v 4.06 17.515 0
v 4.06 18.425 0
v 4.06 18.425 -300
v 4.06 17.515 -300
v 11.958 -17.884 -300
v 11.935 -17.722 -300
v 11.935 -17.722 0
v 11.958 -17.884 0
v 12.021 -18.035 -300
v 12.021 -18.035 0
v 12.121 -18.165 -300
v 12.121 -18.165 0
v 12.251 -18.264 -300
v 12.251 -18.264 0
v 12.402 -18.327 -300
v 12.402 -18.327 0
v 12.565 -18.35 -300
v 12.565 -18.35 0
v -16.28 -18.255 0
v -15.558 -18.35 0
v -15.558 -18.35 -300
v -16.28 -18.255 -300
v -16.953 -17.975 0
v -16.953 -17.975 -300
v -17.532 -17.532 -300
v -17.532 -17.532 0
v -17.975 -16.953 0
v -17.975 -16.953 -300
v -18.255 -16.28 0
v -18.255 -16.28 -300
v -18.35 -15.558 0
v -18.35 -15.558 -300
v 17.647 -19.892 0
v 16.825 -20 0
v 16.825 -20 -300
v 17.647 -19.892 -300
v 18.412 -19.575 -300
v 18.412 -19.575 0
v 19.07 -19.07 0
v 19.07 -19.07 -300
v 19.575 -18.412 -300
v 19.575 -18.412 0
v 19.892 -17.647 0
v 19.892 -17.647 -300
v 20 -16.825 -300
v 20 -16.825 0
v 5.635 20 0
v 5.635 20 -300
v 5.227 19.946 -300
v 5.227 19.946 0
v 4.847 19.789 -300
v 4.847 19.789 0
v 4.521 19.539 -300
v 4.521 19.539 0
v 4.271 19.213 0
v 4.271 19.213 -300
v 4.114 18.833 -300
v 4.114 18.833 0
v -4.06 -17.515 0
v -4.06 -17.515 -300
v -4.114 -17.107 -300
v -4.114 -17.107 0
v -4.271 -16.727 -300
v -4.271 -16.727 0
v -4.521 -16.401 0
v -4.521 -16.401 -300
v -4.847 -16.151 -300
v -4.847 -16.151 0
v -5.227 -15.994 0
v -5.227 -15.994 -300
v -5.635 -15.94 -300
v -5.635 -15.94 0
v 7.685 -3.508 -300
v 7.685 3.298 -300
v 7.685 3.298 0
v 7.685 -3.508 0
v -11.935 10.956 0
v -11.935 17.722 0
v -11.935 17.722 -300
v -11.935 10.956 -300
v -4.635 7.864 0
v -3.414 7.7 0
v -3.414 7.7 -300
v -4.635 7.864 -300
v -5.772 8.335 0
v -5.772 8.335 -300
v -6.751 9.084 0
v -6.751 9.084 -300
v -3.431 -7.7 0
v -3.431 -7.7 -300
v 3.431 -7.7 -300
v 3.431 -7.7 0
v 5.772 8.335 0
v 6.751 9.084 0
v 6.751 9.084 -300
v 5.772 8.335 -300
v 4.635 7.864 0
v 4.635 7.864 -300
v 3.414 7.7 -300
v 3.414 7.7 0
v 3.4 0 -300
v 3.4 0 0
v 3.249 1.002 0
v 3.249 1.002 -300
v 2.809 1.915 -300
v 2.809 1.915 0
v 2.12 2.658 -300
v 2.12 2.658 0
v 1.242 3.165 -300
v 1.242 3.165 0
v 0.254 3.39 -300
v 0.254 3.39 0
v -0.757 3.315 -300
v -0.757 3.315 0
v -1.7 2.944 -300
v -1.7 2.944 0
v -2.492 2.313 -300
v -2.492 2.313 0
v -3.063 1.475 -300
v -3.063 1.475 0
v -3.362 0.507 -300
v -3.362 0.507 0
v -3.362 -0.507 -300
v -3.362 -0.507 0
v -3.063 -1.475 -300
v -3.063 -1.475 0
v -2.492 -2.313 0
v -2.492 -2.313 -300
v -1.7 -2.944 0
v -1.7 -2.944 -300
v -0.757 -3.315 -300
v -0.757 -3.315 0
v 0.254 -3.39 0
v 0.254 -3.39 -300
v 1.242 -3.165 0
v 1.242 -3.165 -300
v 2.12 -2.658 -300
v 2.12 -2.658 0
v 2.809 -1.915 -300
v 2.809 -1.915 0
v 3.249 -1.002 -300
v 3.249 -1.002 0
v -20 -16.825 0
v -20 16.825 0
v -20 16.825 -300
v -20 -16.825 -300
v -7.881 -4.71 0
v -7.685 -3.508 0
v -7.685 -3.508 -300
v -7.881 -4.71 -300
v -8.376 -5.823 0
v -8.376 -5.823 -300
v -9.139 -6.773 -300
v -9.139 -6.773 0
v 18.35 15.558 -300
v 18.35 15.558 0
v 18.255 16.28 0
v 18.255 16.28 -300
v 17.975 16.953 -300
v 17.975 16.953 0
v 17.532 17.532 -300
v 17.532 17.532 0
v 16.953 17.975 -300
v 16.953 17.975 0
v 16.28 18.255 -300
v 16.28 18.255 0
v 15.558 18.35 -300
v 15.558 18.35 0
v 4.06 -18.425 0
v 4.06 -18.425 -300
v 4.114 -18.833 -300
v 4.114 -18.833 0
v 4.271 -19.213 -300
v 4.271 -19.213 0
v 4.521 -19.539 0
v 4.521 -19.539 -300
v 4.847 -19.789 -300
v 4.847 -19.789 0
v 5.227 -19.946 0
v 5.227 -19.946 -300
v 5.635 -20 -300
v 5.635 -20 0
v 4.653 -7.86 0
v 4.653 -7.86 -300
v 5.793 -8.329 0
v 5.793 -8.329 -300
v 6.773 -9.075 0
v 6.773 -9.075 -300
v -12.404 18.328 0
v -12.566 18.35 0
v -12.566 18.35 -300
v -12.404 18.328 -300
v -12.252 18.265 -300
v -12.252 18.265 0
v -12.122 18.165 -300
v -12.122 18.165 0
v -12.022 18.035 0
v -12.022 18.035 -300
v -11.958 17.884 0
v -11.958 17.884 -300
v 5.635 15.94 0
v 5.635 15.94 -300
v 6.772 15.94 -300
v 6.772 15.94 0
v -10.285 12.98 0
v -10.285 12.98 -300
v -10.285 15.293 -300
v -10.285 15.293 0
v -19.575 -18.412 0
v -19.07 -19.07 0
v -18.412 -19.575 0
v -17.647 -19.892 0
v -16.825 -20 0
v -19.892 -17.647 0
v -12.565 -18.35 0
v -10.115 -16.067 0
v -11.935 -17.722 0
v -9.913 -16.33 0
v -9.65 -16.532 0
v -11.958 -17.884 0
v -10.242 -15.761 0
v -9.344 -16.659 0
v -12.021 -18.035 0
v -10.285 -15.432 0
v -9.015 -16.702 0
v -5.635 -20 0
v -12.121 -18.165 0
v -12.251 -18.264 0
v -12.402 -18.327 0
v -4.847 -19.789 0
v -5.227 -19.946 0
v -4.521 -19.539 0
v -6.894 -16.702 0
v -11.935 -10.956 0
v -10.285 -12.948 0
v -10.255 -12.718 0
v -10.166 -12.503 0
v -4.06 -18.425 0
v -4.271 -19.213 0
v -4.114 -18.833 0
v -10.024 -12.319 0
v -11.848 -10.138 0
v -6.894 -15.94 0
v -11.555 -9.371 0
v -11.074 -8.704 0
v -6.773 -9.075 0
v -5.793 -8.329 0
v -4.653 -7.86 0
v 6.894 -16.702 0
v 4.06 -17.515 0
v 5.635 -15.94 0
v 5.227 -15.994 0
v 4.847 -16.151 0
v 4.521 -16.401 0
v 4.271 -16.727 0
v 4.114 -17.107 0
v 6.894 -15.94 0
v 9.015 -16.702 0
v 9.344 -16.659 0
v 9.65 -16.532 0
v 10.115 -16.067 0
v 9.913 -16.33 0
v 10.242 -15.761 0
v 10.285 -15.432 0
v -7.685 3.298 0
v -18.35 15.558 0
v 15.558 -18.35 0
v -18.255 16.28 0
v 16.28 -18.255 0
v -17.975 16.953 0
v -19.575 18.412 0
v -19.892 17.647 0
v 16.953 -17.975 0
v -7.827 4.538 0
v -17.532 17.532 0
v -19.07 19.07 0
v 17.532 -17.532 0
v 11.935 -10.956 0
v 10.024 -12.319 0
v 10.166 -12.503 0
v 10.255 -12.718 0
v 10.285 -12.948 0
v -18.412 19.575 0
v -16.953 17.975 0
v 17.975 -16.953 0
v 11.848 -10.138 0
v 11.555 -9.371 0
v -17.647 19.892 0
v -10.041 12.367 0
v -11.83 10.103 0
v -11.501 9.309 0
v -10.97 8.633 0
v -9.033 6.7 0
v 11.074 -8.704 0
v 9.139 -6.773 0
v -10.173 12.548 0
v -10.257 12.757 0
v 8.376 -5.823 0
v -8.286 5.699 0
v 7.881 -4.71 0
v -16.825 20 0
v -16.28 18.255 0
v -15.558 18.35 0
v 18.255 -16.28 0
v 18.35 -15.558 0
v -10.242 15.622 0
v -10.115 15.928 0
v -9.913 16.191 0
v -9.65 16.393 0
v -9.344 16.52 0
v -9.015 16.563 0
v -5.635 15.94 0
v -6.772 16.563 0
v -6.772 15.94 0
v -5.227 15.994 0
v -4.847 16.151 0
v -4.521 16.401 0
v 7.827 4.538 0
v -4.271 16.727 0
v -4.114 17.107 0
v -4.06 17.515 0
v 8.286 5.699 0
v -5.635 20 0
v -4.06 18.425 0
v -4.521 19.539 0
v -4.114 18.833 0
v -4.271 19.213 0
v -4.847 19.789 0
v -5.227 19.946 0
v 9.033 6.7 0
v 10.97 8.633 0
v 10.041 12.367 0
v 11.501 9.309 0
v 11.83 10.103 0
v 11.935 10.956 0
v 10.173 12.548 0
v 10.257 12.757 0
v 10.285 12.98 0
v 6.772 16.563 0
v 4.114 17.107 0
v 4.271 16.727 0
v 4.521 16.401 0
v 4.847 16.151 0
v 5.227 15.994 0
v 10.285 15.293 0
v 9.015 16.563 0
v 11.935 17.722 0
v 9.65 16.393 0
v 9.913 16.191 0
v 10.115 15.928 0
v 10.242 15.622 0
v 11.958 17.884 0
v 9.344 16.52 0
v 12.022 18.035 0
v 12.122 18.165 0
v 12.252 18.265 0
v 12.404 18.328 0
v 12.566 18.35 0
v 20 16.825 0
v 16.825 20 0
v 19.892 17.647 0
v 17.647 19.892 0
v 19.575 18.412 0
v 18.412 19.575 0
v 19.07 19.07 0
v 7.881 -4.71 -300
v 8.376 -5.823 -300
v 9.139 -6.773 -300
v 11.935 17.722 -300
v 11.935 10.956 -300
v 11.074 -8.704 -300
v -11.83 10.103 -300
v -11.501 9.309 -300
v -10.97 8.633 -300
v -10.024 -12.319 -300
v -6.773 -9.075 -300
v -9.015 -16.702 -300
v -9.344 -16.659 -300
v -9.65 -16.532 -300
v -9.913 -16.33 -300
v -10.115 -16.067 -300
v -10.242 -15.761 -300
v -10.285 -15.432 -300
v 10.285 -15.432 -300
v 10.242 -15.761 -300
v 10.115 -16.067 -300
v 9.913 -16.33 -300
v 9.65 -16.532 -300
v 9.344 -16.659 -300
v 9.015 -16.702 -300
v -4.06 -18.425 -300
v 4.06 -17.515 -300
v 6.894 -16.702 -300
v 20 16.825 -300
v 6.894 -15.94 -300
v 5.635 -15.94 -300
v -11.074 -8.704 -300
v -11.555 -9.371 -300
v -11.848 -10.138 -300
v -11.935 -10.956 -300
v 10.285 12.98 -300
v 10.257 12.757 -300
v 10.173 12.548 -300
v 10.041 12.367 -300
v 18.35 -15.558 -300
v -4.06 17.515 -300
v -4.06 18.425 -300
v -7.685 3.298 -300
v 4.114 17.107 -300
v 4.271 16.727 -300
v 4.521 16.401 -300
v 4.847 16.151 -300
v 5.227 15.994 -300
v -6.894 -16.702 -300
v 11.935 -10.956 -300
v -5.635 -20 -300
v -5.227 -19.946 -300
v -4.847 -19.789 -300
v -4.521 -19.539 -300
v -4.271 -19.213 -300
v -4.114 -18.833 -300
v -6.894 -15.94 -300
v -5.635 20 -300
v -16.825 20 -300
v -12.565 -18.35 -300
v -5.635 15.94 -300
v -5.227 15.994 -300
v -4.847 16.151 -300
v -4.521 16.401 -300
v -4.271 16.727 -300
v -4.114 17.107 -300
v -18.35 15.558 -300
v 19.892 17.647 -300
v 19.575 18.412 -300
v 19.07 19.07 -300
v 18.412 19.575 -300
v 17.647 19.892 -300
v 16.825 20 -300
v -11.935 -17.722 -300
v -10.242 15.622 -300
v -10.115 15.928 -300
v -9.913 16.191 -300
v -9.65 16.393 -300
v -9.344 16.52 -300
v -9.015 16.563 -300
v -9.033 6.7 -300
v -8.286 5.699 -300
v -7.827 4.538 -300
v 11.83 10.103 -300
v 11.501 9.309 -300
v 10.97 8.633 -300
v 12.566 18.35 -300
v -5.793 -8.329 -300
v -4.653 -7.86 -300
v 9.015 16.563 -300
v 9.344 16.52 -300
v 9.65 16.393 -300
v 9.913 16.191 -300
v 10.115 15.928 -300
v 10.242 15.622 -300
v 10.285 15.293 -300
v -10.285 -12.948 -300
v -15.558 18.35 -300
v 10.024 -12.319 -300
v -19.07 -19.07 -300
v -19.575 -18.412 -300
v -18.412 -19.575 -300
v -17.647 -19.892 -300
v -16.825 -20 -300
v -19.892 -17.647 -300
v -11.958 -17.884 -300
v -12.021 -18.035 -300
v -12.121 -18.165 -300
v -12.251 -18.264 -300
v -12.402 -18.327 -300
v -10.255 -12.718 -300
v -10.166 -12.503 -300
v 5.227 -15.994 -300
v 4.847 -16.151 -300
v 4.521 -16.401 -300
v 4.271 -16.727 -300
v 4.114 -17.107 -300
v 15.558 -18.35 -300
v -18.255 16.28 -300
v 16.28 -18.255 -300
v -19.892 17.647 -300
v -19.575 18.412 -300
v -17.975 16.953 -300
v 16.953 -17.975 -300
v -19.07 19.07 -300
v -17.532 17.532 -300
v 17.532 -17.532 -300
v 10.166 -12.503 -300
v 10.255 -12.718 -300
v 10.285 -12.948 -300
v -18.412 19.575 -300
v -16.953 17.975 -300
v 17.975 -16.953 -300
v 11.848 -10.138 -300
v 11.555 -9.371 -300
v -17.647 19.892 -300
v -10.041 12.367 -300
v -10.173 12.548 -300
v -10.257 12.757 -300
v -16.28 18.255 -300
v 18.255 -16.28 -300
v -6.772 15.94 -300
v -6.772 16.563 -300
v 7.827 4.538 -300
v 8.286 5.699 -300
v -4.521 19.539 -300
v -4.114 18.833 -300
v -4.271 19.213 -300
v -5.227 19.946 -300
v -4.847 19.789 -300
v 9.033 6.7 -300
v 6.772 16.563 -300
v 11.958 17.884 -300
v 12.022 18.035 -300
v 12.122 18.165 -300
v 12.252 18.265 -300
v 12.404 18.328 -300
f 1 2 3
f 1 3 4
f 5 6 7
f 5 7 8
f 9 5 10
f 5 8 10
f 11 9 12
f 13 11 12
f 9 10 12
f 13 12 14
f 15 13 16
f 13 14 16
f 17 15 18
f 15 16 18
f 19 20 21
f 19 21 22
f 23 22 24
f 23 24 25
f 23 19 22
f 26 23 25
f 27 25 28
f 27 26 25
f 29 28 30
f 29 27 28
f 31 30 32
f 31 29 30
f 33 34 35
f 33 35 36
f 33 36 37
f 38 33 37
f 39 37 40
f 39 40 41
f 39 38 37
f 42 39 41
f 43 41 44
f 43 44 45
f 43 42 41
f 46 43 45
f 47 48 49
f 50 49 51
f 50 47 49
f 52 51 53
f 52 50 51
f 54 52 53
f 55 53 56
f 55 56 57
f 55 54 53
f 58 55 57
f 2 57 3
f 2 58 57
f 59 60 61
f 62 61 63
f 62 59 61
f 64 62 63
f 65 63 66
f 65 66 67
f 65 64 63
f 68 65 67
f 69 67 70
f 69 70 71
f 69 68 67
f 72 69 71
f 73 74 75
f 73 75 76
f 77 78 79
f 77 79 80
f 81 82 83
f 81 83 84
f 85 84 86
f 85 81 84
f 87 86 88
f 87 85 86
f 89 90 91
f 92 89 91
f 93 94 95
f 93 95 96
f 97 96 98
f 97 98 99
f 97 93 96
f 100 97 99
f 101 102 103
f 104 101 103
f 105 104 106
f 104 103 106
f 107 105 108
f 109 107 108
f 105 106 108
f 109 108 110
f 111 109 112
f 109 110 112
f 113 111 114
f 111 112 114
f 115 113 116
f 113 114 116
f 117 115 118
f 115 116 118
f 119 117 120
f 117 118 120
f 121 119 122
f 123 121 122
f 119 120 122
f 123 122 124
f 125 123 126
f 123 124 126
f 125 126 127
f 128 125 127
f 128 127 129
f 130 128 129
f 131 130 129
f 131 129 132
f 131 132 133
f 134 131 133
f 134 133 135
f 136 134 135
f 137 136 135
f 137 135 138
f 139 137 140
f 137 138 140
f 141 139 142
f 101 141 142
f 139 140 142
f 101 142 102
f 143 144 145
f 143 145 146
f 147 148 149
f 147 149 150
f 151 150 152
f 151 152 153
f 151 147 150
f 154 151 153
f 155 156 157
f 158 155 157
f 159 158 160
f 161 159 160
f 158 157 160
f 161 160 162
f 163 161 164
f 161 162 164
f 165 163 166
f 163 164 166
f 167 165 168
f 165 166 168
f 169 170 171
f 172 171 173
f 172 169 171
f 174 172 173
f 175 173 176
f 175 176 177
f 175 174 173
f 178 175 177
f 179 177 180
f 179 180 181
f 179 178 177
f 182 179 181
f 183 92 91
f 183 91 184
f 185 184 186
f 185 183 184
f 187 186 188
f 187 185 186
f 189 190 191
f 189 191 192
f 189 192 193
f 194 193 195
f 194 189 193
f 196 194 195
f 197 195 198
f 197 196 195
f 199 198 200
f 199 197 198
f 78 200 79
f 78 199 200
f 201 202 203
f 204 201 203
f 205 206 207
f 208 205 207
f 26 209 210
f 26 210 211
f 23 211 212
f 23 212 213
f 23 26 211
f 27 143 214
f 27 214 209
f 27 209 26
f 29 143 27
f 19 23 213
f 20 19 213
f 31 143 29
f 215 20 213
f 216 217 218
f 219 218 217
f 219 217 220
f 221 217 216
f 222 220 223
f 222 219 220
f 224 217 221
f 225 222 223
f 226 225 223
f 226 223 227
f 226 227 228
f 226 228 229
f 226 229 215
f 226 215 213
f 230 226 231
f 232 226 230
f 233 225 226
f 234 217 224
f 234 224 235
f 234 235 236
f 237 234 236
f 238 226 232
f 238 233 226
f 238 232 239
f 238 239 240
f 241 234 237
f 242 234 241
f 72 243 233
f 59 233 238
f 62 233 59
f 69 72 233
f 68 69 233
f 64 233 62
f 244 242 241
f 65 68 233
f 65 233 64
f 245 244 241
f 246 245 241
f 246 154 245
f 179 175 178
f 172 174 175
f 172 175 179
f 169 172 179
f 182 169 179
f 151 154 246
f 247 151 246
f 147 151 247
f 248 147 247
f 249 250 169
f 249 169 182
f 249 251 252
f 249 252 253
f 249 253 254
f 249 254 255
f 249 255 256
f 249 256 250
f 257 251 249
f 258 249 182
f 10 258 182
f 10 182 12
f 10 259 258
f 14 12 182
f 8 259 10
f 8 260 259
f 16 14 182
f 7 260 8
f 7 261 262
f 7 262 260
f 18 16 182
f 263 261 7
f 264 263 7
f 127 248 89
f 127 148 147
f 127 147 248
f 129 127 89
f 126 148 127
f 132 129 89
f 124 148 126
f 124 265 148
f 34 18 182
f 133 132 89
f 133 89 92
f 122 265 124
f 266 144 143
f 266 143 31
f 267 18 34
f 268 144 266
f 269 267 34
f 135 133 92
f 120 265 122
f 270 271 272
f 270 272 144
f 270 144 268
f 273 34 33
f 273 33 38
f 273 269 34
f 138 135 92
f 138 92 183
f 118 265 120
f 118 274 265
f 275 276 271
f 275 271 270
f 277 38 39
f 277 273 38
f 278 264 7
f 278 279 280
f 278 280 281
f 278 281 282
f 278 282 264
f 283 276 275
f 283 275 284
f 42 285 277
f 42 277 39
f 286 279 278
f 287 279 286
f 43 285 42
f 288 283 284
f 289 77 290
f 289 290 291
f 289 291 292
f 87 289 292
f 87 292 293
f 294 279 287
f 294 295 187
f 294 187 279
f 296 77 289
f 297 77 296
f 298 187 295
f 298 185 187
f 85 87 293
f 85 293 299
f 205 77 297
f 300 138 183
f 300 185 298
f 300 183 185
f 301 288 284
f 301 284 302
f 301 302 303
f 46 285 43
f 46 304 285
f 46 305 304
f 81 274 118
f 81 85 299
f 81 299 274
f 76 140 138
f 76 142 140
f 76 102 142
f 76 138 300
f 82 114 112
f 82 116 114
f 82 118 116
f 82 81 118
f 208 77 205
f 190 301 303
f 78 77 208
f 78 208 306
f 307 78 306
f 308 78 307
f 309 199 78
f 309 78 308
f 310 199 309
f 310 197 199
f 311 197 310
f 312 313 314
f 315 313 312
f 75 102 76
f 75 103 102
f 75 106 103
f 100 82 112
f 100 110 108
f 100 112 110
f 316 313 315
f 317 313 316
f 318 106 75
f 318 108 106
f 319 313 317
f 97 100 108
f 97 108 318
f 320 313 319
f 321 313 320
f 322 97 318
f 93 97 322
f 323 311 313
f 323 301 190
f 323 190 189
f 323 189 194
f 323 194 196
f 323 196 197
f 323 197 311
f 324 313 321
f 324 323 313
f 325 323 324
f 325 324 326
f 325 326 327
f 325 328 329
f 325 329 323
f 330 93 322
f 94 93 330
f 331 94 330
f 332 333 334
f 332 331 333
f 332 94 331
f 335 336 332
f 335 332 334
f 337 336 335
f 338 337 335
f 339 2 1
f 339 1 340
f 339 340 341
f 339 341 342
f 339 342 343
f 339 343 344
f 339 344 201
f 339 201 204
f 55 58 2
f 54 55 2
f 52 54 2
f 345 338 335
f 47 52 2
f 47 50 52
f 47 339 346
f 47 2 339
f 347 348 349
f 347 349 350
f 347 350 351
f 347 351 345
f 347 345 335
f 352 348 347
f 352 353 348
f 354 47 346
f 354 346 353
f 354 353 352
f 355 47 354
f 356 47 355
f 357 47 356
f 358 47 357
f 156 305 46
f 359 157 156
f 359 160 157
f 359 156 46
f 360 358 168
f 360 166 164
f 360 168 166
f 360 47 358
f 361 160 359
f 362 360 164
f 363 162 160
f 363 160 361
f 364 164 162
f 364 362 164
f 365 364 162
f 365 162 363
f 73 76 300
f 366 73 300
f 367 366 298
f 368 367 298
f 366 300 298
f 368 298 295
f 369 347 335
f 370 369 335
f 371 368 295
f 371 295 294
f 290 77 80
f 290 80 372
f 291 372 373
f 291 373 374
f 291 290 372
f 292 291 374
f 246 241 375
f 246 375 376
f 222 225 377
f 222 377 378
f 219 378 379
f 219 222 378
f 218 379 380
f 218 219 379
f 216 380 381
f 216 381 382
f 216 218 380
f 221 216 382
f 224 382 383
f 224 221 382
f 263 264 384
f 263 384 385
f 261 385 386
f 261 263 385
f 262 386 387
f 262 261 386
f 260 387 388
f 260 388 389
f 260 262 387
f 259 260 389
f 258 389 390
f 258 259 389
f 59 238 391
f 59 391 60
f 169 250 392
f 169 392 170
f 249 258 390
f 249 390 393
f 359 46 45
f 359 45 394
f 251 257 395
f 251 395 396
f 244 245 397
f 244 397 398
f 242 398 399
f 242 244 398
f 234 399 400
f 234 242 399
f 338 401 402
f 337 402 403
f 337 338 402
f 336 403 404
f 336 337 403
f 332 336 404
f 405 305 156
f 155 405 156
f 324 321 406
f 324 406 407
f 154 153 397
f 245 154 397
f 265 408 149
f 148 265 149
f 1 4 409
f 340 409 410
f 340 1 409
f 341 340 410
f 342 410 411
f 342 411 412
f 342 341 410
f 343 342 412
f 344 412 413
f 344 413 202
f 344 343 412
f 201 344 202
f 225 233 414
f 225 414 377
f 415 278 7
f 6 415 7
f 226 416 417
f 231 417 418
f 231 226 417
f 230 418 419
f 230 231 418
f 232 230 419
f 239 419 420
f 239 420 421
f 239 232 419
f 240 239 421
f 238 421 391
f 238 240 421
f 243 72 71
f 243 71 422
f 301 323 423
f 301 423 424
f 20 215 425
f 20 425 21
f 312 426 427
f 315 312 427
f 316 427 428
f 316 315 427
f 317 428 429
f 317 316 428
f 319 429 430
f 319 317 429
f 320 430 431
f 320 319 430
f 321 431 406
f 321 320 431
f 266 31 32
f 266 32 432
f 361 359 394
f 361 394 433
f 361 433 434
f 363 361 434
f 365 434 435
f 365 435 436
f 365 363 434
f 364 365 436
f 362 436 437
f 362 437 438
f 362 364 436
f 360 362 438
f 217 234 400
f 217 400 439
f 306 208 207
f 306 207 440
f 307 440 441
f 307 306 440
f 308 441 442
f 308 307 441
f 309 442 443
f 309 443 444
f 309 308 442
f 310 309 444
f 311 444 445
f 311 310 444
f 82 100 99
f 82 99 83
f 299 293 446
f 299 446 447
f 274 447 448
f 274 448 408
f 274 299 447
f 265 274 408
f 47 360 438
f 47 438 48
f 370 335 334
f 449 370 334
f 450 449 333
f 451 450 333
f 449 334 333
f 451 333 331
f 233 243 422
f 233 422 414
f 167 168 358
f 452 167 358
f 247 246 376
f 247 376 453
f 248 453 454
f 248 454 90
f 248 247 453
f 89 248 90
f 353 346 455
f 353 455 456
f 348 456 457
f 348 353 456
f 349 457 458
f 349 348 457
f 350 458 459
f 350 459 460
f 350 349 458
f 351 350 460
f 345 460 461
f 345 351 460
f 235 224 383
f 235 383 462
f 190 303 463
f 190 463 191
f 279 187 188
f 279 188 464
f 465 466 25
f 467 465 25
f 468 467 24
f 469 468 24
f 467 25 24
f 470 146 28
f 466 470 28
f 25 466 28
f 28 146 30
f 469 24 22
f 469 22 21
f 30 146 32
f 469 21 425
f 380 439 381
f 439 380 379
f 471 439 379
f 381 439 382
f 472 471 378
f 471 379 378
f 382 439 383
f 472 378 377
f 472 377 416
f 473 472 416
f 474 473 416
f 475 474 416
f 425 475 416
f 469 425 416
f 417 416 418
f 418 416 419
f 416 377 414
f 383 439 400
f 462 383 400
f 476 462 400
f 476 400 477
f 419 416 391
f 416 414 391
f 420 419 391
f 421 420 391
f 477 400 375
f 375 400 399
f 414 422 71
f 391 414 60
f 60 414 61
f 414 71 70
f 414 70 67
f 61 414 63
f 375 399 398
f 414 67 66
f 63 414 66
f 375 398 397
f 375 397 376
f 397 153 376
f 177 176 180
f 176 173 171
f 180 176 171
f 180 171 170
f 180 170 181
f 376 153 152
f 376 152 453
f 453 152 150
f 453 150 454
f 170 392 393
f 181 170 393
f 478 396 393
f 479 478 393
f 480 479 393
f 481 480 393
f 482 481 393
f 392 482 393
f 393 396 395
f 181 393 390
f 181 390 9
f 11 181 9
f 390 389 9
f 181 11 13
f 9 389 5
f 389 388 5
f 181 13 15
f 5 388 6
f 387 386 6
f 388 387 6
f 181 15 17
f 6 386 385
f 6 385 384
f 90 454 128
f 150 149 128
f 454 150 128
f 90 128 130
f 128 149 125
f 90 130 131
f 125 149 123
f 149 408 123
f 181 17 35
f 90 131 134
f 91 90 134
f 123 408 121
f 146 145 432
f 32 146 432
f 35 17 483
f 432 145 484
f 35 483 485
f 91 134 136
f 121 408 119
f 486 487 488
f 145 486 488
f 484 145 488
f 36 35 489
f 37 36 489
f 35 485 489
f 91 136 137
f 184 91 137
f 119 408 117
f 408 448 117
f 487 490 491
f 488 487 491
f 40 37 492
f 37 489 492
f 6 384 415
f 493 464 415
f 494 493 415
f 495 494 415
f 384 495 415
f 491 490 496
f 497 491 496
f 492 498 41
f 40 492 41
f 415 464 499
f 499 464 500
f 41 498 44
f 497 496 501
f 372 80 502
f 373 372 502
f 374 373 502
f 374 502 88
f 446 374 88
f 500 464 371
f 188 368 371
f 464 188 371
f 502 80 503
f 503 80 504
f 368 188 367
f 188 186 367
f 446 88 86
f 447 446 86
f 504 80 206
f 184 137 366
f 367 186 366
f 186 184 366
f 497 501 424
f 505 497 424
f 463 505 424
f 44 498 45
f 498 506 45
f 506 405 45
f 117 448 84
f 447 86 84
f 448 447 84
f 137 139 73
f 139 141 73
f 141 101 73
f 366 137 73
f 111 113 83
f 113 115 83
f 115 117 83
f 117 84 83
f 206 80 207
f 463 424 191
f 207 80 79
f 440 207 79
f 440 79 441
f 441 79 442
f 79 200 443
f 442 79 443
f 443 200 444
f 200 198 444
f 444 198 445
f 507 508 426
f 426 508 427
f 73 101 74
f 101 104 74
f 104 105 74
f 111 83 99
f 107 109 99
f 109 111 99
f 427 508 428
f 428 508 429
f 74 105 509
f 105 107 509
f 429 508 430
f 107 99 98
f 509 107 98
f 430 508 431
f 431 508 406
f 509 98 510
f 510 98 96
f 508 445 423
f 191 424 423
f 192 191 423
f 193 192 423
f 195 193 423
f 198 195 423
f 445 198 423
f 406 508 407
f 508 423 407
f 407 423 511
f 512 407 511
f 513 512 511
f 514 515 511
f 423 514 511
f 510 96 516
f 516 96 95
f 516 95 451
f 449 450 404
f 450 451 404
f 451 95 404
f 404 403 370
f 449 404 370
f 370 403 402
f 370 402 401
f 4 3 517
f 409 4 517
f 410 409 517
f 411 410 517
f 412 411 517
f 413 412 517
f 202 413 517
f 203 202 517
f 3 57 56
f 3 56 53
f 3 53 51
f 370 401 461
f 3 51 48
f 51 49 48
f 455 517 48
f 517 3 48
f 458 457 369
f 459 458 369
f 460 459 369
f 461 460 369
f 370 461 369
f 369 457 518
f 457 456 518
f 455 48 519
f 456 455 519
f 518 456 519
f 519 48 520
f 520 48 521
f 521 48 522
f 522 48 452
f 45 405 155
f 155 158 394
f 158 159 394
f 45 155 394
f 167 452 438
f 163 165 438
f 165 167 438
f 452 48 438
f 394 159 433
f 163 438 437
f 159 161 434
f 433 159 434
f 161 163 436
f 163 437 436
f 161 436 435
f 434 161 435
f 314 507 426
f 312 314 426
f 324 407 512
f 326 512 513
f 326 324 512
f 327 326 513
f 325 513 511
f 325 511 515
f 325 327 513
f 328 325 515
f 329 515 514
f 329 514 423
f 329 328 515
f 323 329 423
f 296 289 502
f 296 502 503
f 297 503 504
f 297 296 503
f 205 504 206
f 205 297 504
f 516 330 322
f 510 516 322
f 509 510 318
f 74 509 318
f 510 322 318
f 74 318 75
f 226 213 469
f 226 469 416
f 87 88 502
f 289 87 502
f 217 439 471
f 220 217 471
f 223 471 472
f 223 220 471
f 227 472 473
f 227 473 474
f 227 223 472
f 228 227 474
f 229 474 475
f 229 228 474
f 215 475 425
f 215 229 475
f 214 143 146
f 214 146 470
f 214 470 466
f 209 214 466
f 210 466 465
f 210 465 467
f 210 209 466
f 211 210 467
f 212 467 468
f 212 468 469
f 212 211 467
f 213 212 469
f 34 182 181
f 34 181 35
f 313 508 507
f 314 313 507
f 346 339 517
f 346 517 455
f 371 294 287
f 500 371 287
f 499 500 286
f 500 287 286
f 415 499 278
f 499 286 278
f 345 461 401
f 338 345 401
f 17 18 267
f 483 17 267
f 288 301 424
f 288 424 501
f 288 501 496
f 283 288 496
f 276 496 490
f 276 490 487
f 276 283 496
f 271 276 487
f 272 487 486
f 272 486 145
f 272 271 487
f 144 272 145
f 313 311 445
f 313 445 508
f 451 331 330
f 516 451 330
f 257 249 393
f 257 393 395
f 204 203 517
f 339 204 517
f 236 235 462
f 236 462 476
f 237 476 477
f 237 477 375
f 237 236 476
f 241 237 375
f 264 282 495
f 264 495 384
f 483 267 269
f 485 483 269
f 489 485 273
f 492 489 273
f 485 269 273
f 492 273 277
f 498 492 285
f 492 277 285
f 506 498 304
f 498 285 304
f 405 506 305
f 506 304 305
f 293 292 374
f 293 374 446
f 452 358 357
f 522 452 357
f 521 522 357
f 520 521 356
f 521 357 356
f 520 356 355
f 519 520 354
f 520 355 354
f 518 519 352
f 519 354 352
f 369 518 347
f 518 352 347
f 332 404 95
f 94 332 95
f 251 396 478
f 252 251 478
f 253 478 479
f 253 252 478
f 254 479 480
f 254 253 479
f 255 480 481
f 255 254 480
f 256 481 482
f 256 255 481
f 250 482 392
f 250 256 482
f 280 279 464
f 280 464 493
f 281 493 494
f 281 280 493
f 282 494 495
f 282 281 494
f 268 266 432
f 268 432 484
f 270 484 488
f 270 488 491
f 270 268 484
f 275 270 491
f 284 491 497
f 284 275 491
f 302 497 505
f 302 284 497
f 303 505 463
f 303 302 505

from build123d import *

# Parameters (mm, degrees)
SKETCH1_R      = 3.4
EXTRUDE1_DEPTH = 300


with BuildPart() as part:
    # Sketch1 → Extrude1 (new body)
    with BuildSketch(Plane.XY):
        with BuildLine():
            Line((3.414141554, 7.7), (-3.414141554, 7.7))
            ThreePointArc((-3.414141554, 7.7), (-5.219014233, 8.062418522), (-6.750527179, 9.083878589))
            Line((-6.750527179, 9.083878589), (-10.040658191, 12.367344817))
            ThreePointArc((-10.040658191, 12.367344817), (-10.221657959, 12.649942114), (-10.285, 12.979502327))
            Line((-10.285, 12.979502327), (-10.285, 15.292928509))
            ThreePointArc((-10.285, 15.292928509), (-9.913025612, 16.190954121), (-9.015, 16.562928509))
            Line((-9.015, 16.562928509), (-6.771827505, 16.562928509))
            Line((-6.771827505, 16.562928509), (-6.771827505, 15.94))
            Line((-6.771827505, 15.94), (-5.6348, 15.94))
            ThreePointArc((-5.6348, 15.94), (-4.521248241, 16.401248241), (-4.06, 17.5148))
            Line((-4.06, 17.5148), (-4.06, 18.4252))
            ThreePointArc((-4.06, 18.4252), (-4.521248241, 19.538751759), (-5.6348, 20))
            Line((-5.6348, 20), (-13.0175, 20))
            Line((-13.0175, 20), (-16.825, 20))
            ThreePointArc((-16.825, 20), (-19.07006403, 19.07006403), (-20, 16.825))
            Line((-20, 16.825), (-20, -16.825))
            ThreePointArc((-20, -16.825), (-19.07006403, -19.07006403), (-16.825, -20))
            Line((-16.825, -20), (-13.0175, -20))
            Line((-13.0175, -20), (-5.6348, -20))
            ThreePointArc((-5.6348, -20), (-4.521248241, -19.538751759), (-4.06, -18.4252))
            Line((-4.06, -18.4252), (-4.06, -17.5148))
            ThreePointArc((-4.06, -17.5148), (-4.521248241, -16.401248241), (-5.6348, -15.94))
            Line((-5.6348, -15.94), (-6.893826419, -15.94))
            Line((-6.893826419, -15.94), (-6.893826419, -16.702464473))
            Line((-6.893826419, -16.702464473), (-9.015, -16.702464473))
            ThreePointArc((-9.015, -16.702464473), (-9.913025612, -16.330490085), (-10.285, -15.432464473))
            Line((-10.285, -15.432464473), (-10.285, -12.948084155))
            ThreePointArc((-10.285, -12.948084155), (-10.217156337, -12.607462266), (-10.023980268, -12.318829212))
            Line((-10.023980268, -12.318829212), (-6.773258234, -9.074692133))
            ThreePointArc((-6.773258234, -9.074692133), (-5.238079583, -8.057096539), (-3.431215906, -7.7))
            Line((-3.431215906, -7.7), (3.431215906, -7.7))
            ThreePointArc((3.431215906, -7.7), (5.238079583, -8.057096539), (6.773258234, -9.074692133))
            Line((6.773258234, -9.074692133), (10.023980268, -12.318829212))
            ThreePointArc((10.023980268, -12.318829212), (10.217156337, -12.607462266), (10.285, -12.948084155))
            Line((10.285, -12.948084155), (10.285, -15.432464473))
            ThreePointArc((10.285, -15.432464473), (9.913025612, -16.330490085), (9.015, -16.702464473))
            Line((9.015, -16.702464473), (6.893826419, -16.702464473))
            Line((6.893826419, -16.702464473), (6.893826419, -15.94))
            Line((6.893826419, -15.94), (5.6348, -15.94))
            ThreePointArc((5.6348, -15.94), (4.521248241, -16.401248241), (4.06, -17.5148))
            Line((4.06, -17.5148), (4.06, -18.4252))
            ThreePointArc((4.06, -18.4252), (4.521248241, -19.538751759), (5.6348, -20))
            Line((5.6348, -20), (13.0175, -20))
            Line((13.0175, -20), (16.825, -20))
            ThreePointArc((16.825, -20), (19.07006403, -19.07006403), (20, -16.825))
            Line((20, -16.825), (20, 16.825))
            ThreePointArc((20, 16.825), (19.07006403, 19.07006403), (16.825, 20))
            Line((16.825, 20), (13.0175, 20))
            Line((13.0175, 20), (5.6348, 20))
            ThreePointArc((5.6348, 20), (4.521248241, 19.538751759), (4.06, 18.4252))
            Line((4.06, 18.4252), (4.06, 17.5148))
            ThreePointArc((4.06, 17.5148), (4.521248241, 16.401248241), (5.6348, 15.94))
            Line((5.6348, 15.94), (6.771827505, 15.94))
            Line((6.771827505, 15.94), (6.771827505, 16.562928509))
            Line((6.771827505, 16.562928509), (9.015, 16.562928509))
            ThreePointArc((9.015, 16.562928509), (9.913025612, 16.190954121), (10.285, 15.292928509))
            Line((10.285, 15.292928509), (10.285, 12.979502327))
            ThreePointArc((10.285, 12.979502327), (10.221657959, 12.649942114), (10.040658191, 12.367344817))
            Line((10.040658191, 12.367344817), (6.750527179, 9.083878589))
            ThreePointArc((6.750527179, 9.083878589), (5.219014233, 8.062418522), (3.414141554, 7.7))
        make_face()
        Circle(SKETCH1_R, mode=Mode.SUBTRACT)
        with BuildLine():
            Line((-12.564539323, -18.35), (-15.5575, -18.35))
            ThreePointArc((-15.5575, -18.35), (-17.531656749, -17.531656749), (-18.35, -15.5575))
            Line((-18.35, -15.5575), (-18.35, 15.5575))
            ThreePointArc((-18.35, 15.5575), (-17.531656749, 17.531656749), (-15.5575, 18.35))
            Line((-15.5575, 18.35), (-12.566039323, 18.35))
            ThreePointArc((-12.566039323, 18.35), (-12.121960893, 18.165032537), (-11.935, 17.721789669))
            Line((-11.935, 17.721789669), (-11.935, 10.955500711))
            ThreePointArc((-11.935, 10.955500711), (-11.692410278, 9.694593073), (-10.97025746, 8.632880704))
            Line((-10.97025746, 8.632880704), (-9.032953263, 6.699500885))
            ThreePointArc((-9.032953263, 6.699500885), (-8.018239143, 5.133591891), (-7.685, 3.297654148))
            Line((-7.685, 3.297654148), (-7.685, -3.50798046))
            ThreePointArc((-7.685, -3.50798046), (-8.092979352, -5.282450357), (-9.138589048, -6.773051218))
            Line((-9.138589048, -6.773051218), (-11.073928072, -8.704469846))
            ThreePointArc((-11.073928072, -8.704469846), (-11.72635669, -9.745106152), (-11.935, -10.955500711))
            Line((-11.935, -10.955500711), (-11.935, -17.721789669))
            ThreePointArc((-11.935, -17.721789669), (-12.121425838, -18.164510172), (-12.564539323, -18.35))
        make_face(mode=Mode.SUBTRACT)
        with BuildLine():
            Line((11.935, -10.955500711), (11.935, -17.721789669))
            ThreePointArc((11.935, -17.721789669), (12.121425838, -18.164510172), (12.564539323, -18.35))
            Line((12.564539323, -18.35), (15.5575, -18.35))
            ThreePointArc((15.5575, -18.35), (17.531656749, -17.531656749), (18.35, -15.5575))
            Line((18.35, -15.5575), (18.35, 15.5575))
            ThreePointArc((18.35, 15.5575), (17.531656749, 17.531656749), (15.5575, 18.35))
            Line((15.5575, 18.35), (12.566039323, 18.35))
            ThreePointArc((12.566039323, 18.35), (12.121960893, 18.165032537), (11.935, 17.721789669))
            Line((11.935, 17.721789669), (11.935, 10.955500711))
            ThreePointArc((11.935, 10.955500711), (11.692410278, 9.694593073), (10.97025746, 8.632880704))
            Line((10.97025746, 8.632880704), (9.032953263, 6.699500885))
            ThreePointArc((9.032953263, 6.699500885), (8.018239143, 5.133591891), (7.685, 3.297654148))
            Line((7.685, 3.297654148), (7.685, -3.50798046))
            ThreePointArc((7.685, -3.50798046), (8.092979352, -5.282450357), (9.138589048, -6.773051218))
            Line((9.138589048, -6.773051218), (11.073928072, -8.704469846))
            ThreePointArc((11.073928072, -8.704469846), (11.72635669, -9.745106152), (11.935, -10.955500711))
        make_face(mode=Mode.SUBTRACT)
    extrude(amount=-EXTRUDE1_DEPTH)


solid = part.part
